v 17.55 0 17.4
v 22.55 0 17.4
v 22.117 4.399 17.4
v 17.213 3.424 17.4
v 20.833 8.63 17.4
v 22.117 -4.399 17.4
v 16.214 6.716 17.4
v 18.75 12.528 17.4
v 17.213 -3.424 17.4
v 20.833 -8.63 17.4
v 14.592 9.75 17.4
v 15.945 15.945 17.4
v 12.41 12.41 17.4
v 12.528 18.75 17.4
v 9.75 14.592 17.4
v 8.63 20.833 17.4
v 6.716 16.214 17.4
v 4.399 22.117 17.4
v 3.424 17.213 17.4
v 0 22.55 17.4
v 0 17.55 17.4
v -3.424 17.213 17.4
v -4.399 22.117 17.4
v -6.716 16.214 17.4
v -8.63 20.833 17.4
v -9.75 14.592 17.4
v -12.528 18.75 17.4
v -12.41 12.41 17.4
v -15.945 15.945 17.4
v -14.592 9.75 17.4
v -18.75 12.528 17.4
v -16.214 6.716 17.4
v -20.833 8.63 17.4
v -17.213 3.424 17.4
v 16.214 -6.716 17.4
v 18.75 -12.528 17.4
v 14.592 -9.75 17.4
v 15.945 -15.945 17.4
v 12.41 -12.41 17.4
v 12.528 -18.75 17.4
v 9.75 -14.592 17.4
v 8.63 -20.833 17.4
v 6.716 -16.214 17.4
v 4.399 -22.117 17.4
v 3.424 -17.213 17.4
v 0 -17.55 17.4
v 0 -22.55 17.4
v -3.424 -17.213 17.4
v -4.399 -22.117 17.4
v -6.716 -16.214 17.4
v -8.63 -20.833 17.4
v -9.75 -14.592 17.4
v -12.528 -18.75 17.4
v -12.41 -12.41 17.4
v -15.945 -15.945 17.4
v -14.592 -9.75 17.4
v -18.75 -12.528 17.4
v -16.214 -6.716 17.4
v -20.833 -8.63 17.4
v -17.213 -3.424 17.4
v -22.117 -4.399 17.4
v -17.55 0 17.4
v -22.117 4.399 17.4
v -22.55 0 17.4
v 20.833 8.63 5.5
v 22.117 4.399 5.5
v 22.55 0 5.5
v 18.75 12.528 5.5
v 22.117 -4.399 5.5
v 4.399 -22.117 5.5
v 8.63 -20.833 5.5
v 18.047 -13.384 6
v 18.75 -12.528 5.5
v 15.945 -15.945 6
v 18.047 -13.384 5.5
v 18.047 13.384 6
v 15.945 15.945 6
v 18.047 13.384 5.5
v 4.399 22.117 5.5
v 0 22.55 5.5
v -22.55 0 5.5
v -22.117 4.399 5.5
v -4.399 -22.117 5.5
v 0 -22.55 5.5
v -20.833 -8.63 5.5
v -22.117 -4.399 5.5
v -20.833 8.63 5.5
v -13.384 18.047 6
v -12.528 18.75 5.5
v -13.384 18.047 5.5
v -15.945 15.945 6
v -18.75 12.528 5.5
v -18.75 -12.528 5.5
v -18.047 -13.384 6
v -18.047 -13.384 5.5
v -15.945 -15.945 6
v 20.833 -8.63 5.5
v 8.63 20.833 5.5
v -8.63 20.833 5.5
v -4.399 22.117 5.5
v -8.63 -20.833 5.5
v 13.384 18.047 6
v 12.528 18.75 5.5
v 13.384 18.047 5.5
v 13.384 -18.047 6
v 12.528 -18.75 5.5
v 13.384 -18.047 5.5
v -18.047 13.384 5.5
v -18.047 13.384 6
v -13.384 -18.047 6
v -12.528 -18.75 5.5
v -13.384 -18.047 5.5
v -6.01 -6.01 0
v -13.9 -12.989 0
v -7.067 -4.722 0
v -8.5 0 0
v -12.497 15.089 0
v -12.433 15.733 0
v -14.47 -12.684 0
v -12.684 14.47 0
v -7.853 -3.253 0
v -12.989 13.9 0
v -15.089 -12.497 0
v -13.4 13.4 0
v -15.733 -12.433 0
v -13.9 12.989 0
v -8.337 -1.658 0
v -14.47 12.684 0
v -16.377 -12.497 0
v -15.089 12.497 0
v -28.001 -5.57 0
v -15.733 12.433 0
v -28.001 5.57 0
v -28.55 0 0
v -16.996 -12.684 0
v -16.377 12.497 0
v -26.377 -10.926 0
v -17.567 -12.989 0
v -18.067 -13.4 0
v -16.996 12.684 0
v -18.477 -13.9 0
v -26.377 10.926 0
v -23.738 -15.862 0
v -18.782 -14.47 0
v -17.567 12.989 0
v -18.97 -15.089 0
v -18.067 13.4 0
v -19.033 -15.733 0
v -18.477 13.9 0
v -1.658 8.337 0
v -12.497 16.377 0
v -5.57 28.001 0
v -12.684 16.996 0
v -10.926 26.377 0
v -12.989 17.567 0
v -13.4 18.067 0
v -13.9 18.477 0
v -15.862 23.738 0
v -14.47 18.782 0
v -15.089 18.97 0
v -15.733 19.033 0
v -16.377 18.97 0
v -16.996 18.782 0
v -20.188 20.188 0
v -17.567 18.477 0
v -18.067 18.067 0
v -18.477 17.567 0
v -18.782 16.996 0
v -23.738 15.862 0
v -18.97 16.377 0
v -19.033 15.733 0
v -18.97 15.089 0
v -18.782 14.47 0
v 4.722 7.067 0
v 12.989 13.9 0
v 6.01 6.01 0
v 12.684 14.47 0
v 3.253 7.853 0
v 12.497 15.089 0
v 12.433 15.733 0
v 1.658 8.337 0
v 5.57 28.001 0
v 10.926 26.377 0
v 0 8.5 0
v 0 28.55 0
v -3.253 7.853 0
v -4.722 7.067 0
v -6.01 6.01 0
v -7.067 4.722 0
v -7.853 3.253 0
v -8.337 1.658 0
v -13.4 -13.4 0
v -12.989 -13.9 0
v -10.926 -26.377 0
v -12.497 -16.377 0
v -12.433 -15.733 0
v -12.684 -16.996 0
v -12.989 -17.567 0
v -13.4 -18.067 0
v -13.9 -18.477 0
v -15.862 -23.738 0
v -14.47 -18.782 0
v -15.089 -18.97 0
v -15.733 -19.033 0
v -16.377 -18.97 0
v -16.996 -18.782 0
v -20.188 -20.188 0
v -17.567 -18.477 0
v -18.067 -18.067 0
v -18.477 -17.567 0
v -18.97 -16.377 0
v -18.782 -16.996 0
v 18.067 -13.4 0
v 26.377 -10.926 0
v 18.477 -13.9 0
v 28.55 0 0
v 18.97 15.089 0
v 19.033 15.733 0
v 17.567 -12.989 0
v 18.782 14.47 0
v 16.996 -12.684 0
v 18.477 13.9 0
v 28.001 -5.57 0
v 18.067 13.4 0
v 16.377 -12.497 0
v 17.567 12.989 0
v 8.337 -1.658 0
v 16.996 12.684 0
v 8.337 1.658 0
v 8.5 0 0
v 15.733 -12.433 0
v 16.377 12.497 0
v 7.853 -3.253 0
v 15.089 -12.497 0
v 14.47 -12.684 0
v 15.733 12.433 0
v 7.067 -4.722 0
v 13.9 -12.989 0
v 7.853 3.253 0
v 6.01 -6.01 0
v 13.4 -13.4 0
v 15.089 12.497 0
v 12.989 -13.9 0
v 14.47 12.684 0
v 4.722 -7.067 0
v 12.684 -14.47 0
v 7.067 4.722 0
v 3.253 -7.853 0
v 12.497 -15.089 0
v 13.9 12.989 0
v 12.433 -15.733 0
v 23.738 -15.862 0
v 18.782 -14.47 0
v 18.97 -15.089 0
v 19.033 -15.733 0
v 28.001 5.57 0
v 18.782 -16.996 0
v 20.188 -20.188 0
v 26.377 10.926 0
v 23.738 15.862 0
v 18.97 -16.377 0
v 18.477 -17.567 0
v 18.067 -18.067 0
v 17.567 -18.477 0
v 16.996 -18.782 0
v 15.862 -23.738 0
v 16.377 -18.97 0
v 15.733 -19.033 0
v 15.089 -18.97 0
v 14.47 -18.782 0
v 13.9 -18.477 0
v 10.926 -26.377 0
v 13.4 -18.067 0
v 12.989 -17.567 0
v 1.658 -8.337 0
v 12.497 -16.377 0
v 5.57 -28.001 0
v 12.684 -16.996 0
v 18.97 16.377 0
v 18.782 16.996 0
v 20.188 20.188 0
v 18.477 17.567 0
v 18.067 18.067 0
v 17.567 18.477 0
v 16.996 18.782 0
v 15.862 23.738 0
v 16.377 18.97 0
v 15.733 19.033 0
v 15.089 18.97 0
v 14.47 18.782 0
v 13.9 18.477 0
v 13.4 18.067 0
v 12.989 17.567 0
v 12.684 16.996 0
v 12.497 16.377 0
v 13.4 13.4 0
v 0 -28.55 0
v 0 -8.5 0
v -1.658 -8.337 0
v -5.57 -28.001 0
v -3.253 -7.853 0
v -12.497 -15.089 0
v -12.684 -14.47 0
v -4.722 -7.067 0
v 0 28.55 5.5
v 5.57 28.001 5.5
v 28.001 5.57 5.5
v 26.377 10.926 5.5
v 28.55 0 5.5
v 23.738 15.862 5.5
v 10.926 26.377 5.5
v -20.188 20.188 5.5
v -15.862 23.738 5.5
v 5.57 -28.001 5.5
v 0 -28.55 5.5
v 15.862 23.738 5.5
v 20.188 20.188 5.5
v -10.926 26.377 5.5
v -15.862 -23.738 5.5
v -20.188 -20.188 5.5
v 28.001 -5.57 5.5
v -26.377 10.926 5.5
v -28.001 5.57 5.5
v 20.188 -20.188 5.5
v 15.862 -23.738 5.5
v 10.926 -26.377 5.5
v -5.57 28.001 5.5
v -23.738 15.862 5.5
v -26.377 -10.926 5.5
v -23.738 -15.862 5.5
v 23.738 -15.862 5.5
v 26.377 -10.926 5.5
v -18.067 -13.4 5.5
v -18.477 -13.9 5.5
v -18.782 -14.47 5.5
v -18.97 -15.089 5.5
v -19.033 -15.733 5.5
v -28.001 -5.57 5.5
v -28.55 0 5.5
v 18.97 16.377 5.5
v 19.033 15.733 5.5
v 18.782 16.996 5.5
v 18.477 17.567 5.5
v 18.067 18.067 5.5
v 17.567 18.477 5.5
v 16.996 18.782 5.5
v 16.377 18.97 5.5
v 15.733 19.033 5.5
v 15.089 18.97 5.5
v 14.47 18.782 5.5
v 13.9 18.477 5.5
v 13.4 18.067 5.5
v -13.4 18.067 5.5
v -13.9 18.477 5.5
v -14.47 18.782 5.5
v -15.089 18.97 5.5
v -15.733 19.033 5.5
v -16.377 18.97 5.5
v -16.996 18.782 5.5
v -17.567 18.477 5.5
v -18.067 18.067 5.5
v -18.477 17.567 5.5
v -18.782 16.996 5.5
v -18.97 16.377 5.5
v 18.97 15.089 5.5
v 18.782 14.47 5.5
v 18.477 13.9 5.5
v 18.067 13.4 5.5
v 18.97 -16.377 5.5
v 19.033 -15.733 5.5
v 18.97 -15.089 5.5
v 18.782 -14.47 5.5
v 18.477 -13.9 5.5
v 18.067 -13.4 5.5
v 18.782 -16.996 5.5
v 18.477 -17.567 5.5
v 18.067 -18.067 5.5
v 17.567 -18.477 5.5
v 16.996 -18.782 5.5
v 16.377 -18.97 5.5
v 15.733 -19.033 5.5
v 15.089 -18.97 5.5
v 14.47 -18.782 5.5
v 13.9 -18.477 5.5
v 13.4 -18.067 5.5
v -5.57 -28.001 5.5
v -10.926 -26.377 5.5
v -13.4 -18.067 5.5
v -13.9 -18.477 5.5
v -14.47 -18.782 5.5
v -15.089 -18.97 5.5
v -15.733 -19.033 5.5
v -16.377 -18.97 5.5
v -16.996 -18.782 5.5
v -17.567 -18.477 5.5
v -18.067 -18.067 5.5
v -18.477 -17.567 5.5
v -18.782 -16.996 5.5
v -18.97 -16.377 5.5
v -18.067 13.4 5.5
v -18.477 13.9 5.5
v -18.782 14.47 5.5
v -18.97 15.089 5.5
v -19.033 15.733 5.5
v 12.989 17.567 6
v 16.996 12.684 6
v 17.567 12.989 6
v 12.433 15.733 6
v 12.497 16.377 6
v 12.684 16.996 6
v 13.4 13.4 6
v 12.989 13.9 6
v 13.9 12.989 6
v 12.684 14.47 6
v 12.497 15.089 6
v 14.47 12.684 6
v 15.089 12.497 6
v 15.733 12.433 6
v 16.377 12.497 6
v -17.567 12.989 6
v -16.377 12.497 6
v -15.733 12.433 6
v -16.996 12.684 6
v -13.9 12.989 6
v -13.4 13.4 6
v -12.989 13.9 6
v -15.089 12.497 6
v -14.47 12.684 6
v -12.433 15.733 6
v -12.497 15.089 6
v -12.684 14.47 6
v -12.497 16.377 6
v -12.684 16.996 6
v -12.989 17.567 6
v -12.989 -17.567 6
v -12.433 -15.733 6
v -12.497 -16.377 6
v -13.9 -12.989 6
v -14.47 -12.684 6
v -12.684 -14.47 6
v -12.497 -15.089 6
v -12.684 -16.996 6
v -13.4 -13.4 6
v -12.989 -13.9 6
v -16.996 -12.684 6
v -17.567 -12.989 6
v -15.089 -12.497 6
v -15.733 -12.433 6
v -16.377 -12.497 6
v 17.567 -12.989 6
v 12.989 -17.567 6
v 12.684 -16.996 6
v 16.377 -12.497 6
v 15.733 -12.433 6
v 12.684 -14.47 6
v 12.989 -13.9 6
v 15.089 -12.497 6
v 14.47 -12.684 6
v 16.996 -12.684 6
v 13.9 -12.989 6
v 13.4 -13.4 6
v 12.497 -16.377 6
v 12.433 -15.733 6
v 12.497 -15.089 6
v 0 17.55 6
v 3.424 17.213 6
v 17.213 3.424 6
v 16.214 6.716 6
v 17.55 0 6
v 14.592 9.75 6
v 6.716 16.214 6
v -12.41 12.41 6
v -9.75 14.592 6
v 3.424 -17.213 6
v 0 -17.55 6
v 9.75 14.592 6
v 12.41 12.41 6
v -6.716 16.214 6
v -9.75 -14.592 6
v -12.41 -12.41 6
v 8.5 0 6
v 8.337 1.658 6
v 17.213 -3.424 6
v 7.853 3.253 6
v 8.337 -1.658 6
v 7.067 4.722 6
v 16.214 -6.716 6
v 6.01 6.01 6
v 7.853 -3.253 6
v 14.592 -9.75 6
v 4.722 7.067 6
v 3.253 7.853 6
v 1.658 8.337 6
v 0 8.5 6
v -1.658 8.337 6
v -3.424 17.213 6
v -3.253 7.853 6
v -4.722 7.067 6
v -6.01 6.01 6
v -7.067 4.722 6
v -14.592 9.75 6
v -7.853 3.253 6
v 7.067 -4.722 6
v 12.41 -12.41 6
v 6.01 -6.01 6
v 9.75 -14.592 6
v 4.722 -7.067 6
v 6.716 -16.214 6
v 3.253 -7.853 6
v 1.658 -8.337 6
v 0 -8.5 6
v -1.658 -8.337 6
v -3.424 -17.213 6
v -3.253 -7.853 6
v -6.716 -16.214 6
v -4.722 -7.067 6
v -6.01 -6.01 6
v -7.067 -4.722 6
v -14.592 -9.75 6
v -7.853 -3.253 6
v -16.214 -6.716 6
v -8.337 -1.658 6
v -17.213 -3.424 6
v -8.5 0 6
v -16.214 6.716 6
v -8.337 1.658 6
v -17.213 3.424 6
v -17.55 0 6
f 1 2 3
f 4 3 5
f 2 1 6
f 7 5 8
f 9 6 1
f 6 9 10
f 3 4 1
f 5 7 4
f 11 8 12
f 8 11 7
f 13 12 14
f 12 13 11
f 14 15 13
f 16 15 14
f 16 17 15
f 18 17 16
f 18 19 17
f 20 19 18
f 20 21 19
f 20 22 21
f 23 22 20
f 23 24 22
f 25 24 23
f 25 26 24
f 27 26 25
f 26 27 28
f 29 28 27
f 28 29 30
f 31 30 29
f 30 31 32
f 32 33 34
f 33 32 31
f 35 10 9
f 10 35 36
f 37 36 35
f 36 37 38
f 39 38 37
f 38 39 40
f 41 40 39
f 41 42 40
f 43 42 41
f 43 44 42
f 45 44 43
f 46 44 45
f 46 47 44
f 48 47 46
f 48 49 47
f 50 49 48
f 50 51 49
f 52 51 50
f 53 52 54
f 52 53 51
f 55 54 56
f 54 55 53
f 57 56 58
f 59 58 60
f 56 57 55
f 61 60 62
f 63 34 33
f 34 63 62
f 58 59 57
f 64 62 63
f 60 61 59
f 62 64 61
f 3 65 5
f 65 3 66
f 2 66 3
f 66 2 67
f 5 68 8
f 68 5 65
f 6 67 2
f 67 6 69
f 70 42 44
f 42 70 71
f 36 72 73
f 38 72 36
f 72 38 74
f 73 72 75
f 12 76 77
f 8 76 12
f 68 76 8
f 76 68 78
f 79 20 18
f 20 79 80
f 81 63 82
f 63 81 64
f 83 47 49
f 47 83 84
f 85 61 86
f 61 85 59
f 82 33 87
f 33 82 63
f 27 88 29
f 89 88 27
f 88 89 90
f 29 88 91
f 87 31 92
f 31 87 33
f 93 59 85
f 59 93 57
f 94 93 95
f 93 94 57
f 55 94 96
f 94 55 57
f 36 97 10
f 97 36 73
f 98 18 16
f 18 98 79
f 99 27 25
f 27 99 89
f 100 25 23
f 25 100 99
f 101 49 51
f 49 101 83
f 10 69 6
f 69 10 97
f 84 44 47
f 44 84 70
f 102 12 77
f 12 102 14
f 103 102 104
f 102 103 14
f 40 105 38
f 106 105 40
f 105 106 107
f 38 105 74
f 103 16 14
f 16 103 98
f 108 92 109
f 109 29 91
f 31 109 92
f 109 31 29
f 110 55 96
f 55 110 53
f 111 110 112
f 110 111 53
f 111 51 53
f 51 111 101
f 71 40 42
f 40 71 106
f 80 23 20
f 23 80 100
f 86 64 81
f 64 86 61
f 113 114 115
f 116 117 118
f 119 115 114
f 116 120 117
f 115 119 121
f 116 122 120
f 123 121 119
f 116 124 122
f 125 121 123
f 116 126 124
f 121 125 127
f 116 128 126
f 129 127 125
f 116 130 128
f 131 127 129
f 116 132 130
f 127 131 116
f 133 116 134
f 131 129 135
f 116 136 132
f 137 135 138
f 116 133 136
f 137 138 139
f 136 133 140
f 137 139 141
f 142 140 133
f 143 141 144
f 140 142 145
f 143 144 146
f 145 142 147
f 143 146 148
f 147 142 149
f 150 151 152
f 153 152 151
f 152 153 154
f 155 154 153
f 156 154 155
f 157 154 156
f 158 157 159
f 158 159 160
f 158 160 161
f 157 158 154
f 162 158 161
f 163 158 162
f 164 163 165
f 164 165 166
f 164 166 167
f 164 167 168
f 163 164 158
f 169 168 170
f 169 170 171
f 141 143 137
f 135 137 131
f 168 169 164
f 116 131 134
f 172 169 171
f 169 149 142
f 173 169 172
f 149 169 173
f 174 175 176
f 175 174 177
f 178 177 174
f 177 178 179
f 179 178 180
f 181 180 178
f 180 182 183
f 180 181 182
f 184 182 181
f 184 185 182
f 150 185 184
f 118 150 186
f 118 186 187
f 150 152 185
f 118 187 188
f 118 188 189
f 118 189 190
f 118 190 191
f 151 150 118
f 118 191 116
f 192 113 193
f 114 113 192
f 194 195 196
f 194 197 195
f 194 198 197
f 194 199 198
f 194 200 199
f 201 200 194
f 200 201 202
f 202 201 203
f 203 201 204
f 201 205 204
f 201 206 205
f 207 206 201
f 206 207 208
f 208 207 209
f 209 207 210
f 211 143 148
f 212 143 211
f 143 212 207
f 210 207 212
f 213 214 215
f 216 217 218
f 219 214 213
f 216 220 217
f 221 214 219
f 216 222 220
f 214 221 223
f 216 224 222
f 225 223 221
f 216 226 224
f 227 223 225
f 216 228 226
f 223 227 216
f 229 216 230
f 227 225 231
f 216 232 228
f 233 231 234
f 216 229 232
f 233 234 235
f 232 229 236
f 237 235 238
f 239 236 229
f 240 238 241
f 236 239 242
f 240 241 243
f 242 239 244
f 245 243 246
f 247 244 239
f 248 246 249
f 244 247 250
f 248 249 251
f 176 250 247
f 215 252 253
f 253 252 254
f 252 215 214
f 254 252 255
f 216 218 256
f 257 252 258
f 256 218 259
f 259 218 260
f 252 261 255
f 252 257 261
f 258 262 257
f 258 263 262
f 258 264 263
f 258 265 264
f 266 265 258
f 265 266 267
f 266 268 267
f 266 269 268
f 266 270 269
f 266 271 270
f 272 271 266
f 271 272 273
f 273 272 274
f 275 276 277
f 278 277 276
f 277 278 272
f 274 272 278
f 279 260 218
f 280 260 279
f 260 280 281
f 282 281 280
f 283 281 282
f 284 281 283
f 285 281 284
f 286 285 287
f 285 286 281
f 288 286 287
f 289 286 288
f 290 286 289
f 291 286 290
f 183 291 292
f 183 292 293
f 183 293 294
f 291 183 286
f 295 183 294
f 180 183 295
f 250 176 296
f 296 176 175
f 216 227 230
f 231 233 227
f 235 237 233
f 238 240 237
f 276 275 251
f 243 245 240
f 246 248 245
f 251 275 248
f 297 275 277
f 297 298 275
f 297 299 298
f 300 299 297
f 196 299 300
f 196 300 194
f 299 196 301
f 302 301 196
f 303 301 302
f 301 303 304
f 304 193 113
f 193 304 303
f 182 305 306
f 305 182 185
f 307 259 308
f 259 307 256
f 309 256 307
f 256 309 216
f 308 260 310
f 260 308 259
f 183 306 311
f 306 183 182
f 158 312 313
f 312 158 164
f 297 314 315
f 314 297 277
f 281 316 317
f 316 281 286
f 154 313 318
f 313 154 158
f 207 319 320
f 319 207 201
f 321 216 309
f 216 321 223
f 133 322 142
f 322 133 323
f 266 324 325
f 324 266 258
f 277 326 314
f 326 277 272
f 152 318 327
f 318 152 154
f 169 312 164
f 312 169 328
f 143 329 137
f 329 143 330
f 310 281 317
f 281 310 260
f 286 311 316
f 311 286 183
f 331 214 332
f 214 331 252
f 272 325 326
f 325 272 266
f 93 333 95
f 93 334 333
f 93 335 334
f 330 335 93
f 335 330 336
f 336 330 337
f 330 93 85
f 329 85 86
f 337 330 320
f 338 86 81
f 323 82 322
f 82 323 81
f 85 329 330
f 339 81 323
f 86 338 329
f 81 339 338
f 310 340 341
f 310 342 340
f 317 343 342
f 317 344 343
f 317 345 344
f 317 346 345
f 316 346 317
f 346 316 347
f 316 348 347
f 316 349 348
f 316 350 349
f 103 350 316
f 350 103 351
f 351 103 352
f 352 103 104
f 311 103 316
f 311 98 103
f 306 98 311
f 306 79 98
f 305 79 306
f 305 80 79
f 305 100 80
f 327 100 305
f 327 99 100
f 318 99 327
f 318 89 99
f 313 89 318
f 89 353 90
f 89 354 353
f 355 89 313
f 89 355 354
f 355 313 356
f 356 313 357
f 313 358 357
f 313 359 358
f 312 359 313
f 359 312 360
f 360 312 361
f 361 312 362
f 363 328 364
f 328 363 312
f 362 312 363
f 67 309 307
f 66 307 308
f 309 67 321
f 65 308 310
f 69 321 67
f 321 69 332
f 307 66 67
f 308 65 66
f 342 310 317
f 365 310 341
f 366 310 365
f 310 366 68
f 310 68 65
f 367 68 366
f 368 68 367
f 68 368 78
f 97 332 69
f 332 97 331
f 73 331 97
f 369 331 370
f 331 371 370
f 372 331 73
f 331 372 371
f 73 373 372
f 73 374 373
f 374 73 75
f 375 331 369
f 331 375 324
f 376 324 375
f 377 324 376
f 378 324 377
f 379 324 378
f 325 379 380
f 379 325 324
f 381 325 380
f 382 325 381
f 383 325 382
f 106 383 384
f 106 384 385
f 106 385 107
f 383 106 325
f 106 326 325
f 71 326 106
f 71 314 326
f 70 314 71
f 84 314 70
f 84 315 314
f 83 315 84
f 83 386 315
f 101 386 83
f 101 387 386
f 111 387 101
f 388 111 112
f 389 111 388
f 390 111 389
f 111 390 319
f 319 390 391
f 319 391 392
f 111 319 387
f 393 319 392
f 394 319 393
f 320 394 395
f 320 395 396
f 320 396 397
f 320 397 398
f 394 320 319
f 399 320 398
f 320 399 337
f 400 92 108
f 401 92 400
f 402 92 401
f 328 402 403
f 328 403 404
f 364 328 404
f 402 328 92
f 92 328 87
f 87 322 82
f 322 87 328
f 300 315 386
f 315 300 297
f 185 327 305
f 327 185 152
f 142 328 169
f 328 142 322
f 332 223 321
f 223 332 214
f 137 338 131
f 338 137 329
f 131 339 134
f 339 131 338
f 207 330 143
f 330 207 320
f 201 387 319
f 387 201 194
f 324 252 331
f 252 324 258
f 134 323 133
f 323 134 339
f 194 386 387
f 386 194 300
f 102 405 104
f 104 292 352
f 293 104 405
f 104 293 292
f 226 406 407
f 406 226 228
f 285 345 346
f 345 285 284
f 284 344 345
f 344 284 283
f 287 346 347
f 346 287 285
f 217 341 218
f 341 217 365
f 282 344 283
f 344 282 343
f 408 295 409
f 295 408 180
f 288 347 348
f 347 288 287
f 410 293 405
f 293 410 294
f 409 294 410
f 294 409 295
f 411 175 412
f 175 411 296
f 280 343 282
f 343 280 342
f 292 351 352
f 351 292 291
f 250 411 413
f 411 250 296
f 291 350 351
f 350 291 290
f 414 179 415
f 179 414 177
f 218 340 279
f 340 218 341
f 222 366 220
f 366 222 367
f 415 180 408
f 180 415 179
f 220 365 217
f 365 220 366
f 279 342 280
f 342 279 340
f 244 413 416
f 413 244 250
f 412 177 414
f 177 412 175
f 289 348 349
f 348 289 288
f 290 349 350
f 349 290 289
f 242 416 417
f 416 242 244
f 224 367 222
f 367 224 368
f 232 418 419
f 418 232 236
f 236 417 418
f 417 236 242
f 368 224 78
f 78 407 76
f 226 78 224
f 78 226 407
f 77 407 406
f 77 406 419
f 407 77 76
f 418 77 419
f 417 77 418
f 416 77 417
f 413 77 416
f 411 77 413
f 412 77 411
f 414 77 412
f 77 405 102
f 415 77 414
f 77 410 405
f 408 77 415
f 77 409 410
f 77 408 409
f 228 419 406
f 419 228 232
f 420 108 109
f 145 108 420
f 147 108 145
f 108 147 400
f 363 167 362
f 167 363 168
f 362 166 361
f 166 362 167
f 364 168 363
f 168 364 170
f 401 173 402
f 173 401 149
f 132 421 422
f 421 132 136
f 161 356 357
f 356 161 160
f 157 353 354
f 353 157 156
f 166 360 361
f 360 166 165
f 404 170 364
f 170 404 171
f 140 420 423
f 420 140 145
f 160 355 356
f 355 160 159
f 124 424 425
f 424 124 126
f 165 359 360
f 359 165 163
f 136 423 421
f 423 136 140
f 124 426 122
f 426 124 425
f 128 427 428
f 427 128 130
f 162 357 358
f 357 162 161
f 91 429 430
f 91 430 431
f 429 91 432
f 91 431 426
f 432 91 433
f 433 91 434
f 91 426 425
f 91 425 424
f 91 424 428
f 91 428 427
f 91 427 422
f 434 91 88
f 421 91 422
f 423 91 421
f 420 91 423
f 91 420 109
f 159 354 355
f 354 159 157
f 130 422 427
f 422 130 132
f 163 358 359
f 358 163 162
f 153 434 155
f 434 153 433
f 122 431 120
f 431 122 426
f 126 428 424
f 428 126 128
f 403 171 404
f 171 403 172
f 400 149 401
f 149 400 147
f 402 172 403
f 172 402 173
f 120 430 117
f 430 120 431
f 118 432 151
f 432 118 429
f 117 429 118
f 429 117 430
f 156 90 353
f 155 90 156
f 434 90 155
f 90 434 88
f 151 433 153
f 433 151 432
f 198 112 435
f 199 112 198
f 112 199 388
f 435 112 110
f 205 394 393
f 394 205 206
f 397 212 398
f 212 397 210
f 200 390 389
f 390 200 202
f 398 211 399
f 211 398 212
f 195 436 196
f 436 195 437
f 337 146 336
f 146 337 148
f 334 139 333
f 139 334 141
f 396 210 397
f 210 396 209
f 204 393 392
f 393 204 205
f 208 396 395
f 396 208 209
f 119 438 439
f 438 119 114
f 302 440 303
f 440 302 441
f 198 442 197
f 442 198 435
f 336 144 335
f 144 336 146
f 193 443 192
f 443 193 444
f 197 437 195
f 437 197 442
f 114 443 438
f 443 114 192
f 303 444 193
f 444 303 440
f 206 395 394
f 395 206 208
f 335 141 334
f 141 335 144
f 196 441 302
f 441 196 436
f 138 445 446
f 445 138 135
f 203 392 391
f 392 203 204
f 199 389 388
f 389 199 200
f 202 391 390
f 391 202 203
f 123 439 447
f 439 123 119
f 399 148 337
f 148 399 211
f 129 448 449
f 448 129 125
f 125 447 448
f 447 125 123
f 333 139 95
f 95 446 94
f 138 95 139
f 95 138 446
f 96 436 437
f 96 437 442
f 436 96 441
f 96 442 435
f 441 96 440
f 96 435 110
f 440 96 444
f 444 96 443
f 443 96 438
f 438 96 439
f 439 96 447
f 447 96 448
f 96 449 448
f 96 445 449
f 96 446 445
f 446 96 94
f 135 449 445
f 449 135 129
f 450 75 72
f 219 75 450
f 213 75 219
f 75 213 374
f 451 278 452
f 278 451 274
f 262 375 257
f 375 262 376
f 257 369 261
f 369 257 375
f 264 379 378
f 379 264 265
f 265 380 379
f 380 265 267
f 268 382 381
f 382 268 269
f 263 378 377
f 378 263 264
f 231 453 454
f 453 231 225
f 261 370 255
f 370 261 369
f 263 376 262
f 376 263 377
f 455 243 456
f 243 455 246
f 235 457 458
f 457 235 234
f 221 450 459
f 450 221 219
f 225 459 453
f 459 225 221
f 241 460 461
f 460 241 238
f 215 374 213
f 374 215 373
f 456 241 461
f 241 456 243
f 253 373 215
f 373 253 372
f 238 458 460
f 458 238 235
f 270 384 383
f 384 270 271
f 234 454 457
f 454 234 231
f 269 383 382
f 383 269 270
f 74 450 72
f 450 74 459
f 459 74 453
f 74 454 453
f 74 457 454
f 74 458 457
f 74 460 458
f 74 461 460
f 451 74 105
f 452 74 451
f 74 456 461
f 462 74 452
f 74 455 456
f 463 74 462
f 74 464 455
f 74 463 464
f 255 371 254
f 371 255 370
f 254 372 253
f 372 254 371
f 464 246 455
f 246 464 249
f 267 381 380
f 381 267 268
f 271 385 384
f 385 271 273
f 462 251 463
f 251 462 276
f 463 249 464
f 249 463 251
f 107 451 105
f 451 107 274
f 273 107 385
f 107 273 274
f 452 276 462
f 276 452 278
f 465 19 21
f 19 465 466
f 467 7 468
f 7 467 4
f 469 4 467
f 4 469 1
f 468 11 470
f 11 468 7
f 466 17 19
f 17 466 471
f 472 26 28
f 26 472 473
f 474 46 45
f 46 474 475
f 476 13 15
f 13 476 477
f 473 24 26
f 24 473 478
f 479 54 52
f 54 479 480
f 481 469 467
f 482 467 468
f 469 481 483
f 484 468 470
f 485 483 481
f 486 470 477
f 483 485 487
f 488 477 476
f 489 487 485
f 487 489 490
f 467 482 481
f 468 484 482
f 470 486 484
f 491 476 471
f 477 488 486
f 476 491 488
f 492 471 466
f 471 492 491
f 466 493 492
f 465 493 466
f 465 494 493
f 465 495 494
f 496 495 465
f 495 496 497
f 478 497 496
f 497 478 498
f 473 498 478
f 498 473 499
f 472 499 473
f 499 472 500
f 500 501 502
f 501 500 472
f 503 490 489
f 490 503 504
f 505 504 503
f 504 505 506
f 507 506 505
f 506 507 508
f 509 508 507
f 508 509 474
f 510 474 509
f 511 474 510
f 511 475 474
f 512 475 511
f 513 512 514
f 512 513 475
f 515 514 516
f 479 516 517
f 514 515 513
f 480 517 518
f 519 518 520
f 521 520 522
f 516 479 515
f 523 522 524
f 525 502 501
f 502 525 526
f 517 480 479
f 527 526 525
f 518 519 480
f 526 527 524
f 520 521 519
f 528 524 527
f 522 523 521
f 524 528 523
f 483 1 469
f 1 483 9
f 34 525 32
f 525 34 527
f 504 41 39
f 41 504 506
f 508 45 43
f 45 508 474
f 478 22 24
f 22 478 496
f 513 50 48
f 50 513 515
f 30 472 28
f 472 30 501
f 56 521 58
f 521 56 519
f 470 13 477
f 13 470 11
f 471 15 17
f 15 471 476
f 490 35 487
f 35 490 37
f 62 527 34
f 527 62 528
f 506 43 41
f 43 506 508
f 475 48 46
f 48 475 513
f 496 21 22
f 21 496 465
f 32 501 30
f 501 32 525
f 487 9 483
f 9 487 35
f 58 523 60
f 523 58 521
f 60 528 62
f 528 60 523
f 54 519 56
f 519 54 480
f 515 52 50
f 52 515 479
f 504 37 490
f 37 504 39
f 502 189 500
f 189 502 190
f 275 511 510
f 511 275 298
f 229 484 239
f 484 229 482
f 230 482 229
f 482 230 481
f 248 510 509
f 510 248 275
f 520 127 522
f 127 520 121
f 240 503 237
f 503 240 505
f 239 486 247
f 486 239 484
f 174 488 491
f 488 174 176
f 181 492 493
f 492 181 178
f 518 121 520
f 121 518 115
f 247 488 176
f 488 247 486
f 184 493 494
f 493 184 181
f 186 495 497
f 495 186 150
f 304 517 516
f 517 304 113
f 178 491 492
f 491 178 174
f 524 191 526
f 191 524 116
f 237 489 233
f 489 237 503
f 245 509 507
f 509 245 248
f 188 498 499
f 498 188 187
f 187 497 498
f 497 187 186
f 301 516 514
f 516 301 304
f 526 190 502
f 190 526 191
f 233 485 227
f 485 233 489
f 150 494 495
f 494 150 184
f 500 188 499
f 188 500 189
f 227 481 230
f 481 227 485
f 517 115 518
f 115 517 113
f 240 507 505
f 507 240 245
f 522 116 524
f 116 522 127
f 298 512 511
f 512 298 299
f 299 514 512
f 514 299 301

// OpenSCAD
$fn = 32;

// ----------------------------------------------------------------------
// Bearing housing: seat for 6202 (35 x 11 mm), 45.1 mm body
// ----------------------------------------------------------------------

// --- parameters (mm) ---
housing_d = 45.1;         // housing outside diameter
housing_h = 17.4;         // overall housing height
wall_t = 5;               // wall thickness
seat_d = 35.1;            // 6202 seat, 0.1 mm clearance
seat_h = 11.4;            // pocket depth
shoulder = 2;             // shoulder under the bearing
pass_d = 17;              // shaft passage
flange_d = 57.1;          // mounting flange diameter
flange_t = 4;             // flange thickness
bolt_d = 6.6;             // flange bolt clearance
bolt_r = 22.25;           // flange bolt circle radius

module body() {
  cylinder(h = housing_h, d = housing_d);
}

module flange() {
  /* flange sunk 1.5 mm into the body */
  cylinder(h = flange_t + 1.5, d = flange_d);
}

difference() {
  union() {
    body();
    flange();
  }
  translate([0, 0, housing_h - seat_h]) cylinder(h = seat_h + 1, d = seat_d);
  translate([0, 0, -1]) cylinder(h = housing_h - seat_h + 1, d = pass_d);
  for (i = [0 : 3]) rotate([0, 0, 45 + i * 90]) translate([bolt_r, 0, -1])
    cylinder(h = flange_t + 3, d = bolt_d);
}
